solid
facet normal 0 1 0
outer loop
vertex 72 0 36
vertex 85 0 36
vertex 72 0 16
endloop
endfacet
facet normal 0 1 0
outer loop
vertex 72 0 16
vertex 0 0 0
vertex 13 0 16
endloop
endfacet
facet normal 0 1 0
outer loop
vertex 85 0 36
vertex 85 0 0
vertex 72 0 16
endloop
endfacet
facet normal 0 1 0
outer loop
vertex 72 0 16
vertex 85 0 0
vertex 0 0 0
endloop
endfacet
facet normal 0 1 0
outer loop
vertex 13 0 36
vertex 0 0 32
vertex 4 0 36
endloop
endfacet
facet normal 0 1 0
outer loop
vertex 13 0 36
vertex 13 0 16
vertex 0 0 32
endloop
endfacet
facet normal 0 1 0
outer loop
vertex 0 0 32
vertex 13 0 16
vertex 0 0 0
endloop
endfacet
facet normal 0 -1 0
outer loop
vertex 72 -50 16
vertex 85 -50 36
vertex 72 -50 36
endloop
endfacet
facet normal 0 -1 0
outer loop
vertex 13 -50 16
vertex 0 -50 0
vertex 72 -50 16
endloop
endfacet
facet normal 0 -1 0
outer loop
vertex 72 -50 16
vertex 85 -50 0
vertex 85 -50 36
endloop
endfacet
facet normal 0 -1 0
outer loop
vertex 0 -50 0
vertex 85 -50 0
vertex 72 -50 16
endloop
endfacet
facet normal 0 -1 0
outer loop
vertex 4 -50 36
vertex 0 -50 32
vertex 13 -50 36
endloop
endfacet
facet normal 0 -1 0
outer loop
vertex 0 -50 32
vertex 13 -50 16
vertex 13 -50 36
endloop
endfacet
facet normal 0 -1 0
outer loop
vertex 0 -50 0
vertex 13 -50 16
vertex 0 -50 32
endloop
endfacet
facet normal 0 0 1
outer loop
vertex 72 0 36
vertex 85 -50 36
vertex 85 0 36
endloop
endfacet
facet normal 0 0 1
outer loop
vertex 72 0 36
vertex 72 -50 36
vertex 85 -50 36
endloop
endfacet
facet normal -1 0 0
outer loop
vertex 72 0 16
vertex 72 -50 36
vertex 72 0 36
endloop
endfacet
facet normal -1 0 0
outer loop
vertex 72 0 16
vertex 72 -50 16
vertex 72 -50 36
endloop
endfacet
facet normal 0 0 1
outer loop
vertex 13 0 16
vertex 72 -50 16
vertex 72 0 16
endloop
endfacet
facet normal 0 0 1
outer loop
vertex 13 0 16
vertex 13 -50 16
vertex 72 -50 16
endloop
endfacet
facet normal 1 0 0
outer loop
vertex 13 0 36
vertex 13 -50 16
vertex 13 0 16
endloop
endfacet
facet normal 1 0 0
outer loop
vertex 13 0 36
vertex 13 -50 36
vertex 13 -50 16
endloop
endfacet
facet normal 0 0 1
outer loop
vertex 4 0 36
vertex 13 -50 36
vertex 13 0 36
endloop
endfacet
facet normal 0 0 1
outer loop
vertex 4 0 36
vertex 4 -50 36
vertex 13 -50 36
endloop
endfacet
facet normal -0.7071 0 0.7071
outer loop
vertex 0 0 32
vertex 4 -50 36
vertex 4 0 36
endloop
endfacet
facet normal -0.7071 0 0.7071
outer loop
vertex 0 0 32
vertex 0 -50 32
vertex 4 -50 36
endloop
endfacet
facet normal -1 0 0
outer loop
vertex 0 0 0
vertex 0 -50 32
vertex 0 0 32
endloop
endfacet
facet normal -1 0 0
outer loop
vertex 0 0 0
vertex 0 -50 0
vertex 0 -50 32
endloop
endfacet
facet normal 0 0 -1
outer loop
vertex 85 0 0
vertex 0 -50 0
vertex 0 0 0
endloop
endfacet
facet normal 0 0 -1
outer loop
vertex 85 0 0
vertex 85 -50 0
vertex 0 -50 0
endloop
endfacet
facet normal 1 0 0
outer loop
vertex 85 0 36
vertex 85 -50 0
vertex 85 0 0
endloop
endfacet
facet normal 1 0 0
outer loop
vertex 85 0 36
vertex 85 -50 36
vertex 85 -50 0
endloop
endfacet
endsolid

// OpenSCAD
rotate(v=[1,0,0], a=90) {
	linear_extrude(50) {
		polygon([
		    [0,0],
		    [85,0],
		    [85,36],
		    [72,36],
		    [72,16],
		    [13,16],
		    [13,36],
		    [4,36],
		    [0,32]
		]);
	}
}
